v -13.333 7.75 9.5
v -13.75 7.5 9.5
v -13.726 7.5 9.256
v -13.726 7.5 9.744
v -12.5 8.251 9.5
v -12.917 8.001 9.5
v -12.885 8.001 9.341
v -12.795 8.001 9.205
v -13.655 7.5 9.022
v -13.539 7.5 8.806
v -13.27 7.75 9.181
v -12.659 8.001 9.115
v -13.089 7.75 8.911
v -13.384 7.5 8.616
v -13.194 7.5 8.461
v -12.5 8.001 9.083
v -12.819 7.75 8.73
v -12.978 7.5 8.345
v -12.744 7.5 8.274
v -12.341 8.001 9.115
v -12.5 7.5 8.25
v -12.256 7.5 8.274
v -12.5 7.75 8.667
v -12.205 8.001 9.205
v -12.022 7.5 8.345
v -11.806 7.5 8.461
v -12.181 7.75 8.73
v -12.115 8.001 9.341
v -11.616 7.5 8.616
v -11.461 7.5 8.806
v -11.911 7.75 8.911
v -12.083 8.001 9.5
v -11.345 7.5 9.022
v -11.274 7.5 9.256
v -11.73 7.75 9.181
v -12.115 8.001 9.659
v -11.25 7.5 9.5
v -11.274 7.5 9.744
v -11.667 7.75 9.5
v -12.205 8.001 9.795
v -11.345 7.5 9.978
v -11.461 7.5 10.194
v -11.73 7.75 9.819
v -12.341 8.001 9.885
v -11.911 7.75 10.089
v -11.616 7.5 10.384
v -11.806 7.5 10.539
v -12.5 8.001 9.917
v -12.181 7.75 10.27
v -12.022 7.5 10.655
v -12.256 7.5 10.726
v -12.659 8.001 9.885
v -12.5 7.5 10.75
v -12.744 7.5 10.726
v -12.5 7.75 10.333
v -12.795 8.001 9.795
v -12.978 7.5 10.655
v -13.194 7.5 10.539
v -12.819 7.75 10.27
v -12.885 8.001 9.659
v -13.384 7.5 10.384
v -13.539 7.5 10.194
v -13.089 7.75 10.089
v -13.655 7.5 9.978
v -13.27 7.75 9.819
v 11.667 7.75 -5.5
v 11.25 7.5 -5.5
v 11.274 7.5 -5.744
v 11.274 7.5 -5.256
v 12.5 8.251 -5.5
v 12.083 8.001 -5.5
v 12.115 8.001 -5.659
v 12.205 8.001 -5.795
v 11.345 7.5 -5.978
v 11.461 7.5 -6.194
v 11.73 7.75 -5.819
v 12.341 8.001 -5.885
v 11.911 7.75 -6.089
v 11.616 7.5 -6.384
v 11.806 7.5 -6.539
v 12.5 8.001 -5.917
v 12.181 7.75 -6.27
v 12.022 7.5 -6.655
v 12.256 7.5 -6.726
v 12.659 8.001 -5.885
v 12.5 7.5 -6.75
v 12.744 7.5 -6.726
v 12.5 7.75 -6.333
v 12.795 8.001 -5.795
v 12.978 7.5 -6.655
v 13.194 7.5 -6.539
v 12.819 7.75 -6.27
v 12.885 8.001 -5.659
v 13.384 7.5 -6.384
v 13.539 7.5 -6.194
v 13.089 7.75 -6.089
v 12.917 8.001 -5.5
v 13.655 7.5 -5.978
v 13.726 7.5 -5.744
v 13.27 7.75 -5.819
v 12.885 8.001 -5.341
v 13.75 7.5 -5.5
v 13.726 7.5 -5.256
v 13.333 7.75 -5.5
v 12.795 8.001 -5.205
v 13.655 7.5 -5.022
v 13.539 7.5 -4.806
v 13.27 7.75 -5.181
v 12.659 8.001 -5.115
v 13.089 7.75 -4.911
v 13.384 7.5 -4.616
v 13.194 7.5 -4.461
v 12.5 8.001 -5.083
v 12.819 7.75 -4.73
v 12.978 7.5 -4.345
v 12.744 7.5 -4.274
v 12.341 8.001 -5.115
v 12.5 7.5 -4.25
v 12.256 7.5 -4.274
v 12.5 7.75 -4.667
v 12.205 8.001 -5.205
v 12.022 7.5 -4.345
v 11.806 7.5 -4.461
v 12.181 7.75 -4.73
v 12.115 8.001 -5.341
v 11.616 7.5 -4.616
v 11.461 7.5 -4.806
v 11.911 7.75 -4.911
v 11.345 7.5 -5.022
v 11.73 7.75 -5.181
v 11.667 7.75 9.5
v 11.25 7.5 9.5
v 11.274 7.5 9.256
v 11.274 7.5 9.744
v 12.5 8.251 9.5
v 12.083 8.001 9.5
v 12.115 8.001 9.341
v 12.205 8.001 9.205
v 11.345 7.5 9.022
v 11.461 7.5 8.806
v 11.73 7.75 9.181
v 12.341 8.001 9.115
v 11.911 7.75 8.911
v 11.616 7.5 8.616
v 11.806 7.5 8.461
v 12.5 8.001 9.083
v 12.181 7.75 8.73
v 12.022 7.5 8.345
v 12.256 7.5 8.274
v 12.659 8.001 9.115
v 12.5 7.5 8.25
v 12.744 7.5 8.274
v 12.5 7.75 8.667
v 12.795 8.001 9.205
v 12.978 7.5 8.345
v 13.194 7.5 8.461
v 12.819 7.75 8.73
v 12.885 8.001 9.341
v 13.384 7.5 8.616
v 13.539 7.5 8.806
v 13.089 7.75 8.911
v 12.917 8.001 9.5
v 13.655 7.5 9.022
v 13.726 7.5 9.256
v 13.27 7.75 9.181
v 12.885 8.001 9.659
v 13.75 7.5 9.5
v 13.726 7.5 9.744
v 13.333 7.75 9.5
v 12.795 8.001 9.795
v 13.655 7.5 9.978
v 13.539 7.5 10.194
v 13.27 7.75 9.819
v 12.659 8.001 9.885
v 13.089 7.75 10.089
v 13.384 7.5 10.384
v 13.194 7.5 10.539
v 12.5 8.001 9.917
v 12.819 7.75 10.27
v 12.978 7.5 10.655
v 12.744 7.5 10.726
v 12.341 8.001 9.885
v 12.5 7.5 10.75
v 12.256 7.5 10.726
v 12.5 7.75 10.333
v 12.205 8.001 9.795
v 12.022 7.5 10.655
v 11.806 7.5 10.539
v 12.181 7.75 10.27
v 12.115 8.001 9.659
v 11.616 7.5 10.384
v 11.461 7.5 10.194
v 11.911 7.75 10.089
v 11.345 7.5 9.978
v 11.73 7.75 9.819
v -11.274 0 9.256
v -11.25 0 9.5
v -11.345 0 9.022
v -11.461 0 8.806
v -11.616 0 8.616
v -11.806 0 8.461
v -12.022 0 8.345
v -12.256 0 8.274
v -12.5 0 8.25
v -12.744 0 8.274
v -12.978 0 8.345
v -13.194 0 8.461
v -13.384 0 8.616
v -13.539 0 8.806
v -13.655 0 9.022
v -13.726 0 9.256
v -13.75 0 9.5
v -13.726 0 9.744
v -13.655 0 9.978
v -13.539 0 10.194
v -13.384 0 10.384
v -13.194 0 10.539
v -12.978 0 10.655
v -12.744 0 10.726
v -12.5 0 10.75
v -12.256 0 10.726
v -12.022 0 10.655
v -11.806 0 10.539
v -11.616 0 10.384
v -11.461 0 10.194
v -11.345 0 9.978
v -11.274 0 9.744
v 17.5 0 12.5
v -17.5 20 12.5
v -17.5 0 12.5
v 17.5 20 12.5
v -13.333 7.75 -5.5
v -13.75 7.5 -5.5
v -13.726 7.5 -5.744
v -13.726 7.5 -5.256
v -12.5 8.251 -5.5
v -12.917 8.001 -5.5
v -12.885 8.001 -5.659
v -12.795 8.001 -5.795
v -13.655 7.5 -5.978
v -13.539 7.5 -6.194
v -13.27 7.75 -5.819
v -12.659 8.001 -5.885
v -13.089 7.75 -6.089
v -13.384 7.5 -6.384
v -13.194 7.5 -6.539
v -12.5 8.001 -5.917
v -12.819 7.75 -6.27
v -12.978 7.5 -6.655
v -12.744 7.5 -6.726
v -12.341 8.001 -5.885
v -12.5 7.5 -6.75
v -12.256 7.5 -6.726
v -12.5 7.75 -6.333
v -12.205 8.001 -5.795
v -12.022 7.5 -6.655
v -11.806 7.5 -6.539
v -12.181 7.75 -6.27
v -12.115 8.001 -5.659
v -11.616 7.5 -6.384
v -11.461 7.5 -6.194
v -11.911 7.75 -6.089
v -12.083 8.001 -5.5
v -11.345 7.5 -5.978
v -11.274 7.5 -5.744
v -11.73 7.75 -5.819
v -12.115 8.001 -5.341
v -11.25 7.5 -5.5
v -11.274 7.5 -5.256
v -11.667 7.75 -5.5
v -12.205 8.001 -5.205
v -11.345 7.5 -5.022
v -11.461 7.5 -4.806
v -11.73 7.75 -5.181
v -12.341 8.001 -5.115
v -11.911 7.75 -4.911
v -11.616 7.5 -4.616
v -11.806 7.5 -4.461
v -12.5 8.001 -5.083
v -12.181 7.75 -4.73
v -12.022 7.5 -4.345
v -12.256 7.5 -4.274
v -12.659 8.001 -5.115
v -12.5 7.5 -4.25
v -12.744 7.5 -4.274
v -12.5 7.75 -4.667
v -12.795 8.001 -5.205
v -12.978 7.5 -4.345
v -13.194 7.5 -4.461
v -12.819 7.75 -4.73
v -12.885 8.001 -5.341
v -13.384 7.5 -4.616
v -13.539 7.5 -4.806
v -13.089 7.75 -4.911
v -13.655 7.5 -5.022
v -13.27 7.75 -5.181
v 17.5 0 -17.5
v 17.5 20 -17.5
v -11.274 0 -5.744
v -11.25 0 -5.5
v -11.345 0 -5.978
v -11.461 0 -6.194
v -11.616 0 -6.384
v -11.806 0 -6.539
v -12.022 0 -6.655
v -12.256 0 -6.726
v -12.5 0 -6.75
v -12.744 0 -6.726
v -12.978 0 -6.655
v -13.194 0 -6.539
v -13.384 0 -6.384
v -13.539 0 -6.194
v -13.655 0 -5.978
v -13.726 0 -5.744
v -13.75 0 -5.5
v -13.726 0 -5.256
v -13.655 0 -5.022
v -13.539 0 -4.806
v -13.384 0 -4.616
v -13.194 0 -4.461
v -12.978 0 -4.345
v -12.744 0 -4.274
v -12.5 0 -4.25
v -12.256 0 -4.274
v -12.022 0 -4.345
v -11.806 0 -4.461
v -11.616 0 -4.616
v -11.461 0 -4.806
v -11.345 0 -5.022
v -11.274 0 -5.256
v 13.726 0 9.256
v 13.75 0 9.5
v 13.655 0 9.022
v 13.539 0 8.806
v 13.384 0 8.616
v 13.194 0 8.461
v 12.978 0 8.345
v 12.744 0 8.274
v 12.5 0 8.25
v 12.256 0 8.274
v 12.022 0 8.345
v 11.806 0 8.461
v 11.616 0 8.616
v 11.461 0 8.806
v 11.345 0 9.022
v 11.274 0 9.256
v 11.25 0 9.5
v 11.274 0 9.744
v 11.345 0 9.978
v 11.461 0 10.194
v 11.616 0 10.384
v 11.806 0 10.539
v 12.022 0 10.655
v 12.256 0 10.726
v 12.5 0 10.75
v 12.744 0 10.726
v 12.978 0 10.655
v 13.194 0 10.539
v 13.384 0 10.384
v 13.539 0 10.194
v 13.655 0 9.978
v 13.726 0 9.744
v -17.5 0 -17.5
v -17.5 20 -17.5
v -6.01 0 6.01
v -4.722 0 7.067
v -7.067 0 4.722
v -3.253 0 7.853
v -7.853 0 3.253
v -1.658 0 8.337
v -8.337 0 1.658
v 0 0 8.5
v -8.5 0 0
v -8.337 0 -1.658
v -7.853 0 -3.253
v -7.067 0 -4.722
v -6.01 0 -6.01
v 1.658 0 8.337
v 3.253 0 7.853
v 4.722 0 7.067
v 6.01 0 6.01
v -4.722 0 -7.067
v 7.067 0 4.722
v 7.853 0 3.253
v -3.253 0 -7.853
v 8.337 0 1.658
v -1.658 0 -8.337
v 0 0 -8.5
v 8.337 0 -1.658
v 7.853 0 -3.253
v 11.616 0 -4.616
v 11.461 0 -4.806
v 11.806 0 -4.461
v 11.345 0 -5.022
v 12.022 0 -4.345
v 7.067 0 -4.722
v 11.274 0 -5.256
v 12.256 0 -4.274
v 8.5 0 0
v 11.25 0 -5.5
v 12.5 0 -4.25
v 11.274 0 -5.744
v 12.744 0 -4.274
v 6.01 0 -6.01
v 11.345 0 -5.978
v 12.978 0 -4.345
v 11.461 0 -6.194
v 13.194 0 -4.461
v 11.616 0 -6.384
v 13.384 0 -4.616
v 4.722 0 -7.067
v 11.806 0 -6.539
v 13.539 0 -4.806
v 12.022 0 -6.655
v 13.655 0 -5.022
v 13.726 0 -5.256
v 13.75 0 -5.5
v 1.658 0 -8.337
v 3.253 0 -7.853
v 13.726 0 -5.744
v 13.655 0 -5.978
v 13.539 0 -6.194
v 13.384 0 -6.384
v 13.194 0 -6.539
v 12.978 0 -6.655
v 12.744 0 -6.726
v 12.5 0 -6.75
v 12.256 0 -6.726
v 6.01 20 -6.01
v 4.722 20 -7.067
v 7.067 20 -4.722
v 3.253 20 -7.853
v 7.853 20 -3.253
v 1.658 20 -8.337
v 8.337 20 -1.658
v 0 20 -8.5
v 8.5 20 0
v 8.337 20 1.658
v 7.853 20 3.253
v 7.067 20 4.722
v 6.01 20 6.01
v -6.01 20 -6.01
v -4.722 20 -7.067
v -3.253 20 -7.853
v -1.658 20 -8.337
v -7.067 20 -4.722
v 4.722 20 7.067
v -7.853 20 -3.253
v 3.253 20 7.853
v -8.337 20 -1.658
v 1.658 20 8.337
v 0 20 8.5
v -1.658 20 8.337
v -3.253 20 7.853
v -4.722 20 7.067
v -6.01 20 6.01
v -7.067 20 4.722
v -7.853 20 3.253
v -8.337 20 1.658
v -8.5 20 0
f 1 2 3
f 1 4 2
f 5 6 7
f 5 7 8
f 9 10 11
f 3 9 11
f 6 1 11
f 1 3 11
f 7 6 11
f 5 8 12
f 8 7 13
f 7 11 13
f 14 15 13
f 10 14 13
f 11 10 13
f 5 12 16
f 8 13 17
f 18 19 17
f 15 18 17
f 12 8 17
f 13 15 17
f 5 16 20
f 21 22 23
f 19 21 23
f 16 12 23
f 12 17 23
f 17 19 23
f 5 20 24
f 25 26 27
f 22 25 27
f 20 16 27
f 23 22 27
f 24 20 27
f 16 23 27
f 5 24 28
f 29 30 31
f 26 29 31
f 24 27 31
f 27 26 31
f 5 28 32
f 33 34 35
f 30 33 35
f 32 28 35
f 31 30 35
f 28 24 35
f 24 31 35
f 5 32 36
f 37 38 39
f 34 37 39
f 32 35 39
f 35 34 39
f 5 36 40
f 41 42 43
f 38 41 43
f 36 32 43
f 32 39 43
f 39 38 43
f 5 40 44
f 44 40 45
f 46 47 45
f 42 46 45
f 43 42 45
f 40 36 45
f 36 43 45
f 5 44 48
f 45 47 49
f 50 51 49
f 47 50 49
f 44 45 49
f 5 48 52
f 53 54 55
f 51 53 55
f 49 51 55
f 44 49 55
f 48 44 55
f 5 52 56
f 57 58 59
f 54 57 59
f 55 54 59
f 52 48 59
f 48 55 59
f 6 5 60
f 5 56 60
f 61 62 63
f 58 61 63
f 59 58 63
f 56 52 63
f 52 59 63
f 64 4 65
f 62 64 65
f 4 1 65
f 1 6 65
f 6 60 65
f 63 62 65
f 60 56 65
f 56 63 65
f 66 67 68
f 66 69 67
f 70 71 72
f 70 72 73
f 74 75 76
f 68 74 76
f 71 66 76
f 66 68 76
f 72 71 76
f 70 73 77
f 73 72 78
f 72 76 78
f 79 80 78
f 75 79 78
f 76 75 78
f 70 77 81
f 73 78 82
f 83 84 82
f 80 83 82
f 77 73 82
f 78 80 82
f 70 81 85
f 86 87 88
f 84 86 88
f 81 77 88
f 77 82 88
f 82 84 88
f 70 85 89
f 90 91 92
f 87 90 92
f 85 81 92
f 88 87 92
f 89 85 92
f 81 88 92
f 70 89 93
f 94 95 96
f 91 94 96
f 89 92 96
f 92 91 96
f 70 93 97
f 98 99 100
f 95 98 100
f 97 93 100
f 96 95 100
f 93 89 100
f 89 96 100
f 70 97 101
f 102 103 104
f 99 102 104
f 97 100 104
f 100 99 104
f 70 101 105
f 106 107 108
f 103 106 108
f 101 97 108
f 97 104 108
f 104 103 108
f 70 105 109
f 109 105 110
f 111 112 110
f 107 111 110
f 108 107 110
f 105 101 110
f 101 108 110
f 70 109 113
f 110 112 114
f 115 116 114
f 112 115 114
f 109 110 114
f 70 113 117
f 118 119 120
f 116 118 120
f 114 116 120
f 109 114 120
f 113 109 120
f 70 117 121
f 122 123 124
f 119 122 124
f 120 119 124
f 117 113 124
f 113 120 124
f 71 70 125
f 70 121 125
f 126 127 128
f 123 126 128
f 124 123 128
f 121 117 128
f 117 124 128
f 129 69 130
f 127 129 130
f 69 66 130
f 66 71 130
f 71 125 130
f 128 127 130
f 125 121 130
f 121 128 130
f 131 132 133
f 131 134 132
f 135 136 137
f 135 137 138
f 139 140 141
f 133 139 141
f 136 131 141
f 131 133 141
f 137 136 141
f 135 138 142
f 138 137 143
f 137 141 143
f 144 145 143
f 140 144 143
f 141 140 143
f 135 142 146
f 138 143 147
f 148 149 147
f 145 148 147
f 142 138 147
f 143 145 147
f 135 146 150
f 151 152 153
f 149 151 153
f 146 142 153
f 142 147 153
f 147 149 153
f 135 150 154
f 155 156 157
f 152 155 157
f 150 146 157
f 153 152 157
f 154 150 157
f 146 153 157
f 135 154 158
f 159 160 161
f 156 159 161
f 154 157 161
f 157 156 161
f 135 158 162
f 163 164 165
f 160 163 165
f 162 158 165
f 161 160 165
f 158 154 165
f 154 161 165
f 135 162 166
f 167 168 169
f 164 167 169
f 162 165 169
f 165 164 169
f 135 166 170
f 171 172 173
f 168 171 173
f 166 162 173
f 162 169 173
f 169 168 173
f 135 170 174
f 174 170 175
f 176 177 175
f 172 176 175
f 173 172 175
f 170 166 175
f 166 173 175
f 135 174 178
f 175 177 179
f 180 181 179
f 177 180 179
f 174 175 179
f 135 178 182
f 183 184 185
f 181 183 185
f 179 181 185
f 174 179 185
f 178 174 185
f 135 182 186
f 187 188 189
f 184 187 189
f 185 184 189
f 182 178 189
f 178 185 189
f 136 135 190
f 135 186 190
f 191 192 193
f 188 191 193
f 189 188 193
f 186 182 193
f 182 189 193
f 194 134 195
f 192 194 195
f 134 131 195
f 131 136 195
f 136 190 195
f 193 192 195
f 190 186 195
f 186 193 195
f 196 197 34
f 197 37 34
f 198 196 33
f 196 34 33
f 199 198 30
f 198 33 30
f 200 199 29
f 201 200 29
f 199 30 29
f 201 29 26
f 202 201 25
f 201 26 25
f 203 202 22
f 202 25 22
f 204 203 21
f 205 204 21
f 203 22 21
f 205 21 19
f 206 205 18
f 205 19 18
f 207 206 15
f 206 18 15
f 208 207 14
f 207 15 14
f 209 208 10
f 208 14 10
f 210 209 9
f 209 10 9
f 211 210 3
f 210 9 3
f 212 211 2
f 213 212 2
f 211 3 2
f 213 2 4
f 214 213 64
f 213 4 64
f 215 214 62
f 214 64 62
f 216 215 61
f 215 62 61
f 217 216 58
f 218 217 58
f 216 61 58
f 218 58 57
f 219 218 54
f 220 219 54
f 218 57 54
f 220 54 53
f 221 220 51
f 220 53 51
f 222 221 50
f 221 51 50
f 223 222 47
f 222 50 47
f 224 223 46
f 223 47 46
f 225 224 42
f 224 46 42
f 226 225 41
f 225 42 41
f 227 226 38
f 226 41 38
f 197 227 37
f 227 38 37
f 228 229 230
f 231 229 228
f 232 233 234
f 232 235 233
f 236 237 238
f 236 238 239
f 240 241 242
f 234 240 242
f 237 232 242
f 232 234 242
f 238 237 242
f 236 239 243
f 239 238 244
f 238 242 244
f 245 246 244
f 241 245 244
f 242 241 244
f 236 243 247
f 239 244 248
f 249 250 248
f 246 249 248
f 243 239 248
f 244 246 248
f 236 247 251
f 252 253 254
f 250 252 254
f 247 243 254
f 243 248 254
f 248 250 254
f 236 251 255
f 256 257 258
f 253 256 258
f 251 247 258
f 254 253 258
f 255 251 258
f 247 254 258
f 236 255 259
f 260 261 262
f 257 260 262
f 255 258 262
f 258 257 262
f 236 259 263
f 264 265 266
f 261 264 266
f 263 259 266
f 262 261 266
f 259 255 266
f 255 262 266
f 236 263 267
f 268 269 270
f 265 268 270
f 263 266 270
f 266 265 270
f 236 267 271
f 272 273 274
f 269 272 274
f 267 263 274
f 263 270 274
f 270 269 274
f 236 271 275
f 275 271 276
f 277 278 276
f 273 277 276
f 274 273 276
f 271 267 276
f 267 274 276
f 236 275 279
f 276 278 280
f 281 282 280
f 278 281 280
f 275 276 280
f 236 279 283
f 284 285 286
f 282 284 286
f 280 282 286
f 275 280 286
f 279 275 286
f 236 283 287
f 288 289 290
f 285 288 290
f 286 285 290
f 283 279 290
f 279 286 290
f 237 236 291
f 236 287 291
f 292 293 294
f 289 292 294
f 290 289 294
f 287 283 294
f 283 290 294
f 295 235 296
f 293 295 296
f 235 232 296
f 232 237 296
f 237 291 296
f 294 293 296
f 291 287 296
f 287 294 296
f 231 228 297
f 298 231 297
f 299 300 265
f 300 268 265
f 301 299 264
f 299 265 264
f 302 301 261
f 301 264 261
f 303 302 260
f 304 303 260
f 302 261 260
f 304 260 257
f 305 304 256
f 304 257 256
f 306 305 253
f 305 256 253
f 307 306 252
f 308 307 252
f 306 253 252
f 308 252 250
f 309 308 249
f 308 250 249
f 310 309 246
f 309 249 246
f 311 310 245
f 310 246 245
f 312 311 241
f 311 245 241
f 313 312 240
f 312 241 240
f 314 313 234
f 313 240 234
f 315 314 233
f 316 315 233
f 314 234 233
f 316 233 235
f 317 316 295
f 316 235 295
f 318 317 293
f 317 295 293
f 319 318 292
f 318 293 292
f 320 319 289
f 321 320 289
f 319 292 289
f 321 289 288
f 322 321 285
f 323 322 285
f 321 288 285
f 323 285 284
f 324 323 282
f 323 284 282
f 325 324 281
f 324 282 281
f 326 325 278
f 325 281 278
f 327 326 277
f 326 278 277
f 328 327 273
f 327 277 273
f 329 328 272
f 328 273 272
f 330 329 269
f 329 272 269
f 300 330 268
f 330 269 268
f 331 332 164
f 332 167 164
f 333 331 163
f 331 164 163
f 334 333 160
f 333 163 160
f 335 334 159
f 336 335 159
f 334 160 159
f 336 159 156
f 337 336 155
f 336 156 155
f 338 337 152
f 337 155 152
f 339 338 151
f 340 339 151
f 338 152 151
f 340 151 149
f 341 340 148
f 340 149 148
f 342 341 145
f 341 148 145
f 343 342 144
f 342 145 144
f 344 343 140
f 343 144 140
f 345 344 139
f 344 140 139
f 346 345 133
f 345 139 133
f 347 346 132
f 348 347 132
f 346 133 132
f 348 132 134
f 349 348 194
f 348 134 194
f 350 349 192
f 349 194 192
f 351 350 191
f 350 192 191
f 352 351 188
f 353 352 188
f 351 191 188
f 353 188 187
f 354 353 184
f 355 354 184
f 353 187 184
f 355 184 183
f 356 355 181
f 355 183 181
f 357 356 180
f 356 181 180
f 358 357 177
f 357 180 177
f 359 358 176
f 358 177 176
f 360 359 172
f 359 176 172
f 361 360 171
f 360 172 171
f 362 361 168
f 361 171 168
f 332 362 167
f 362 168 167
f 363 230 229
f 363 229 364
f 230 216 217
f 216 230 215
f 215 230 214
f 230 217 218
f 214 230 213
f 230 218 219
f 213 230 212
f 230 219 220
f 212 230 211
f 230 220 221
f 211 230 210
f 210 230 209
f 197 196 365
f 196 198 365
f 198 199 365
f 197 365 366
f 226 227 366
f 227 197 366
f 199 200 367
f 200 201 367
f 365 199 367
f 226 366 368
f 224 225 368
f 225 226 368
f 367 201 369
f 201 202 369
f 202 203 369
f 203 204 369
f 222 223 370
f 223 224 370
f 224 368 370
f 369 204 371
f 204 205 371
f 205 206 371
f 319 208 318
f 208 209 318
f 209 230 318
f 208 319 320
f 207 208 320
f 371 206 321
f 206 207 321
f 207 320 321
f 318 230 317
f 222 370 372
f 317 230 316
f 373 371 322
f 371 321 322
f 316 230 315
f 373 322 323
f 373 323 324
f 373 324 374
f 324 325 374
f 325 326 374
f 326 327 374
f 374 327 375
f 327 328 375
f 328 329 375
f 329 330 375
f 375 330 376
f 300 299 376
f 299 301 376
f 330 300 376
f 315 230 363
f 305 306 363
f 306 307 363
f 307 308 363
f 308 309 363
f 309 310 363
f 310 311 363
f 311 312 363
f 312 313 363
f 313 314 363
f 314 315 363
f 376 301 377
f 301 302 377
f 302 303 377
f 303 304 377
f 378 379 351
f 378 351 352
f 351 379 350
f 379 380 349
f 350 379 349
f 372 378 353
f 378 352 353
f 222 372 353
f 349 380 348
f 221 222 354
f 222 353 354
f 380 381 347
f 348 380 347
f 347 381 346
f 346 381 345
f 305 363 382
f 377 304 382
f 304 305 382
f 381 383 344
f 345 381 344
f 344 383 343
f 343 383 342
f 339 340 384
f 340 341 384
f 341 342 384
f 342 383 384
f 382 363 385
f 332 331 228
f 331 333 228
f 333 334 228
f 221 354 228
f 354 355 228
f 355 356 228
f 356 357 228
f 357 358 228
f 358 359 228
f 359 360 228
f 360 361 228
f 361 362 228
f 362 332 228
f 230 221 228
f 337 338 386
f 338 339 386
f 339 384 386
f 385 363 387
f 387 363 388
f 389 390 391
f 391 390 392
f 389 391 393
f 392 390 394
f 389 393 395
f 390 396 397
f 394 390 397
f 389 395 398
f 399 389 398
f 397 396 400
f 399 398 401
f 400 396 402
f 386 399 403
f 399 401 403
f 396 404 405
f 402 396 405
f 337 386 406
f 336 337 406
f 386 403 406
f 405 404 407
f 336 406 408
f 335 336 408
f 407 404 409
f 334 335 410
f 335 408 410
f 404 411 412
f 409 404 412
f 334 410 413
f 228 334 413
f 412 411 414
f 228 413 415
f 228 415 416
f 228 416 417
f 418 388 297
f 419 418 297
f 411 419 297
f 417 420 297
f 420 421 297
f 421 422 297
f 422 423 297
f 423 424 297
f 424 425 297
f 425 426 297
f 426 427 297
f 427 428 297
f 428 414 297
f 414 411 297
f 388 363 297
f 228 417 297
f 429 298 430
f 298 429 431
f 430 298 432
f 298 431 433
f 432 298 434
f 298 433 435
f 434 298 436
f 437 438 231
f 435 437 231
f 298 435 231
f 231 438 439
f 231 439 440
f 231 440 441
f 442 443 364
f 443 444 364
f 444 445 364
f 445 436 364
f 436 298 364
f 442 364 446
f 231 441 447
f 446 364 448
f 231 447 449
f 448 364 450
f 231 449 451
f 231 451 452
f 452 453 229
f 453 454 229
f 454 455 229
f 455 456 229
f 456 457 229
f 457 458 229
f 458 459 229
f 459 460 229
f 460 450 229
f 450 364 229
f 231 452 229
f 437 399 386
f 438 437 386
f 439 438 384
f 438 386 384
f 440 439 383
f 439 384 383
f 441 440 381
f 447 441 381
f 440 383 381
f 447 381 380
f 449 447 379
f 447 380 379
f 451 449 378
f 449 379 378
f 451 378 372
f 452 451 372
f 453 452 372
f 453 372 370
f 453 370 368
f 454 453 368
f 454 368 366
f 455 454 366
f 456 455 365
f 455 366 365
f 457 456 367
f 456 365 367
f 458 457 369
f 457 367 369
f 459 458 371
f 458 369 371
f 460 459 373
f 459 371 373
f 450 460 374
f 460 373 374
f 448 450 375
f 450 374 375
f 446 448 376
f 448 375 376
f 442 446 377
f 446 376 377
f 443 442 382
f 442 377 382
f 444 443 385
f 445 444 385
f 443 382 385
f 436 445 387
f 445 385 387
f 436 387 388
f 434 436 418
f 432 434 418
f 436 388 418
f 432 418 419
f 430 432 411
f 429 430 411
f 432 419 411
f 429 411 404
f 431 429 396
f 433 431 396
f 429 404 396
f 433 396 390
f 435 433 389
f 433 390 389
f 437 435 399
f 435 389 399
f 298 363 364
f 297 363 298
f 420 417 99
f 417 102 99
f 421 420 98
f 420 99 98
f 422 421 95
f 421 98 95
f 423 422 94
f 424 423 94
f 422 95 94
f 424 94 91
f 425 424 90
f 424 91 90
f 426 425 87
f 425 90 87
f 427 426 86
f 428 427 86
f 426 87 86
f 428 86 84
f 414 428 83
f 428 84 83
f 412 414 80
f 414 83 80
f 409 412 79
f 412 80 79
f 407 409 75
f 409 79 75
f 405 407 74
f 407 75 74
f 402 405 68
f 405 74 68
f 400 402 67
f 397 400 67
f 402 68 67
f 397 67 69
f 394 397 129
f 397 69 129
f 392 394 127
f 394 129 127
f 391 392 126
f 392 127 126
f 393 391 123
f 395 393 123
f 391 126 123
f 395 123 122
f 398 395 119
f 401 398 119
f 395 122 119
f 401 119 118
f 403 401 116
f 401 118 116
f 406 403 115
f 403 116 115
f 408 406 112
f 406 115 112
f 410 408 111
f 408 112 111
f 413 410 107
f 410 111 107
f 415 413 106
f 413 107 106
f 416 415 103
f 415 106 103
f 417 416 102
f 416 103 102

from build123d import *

# Parameters (mm, degrees)
SKETCH1_W             = 35
SKETCH1_H             = 35
BOSS_EXTRUDE1_DEPTH   = 20
SKETCH2_W             = 35
SKETCH2_H             = 7
BOSS_EXTRUDE2_DEPTH   = 27
SKETCH3_R             = 8.5
CUT_EXTRUDE1_DEPTH    = 20
CUT_EXTRUDE3_REACH    = 22
SKETCH7_W             = 35
SKETCH7_H             = 5
SKETCH9_W             = 7
SKETCH9_H             = 27
CUT_EXTRUDE4_DEPTH    = 40
M3_TAPPED_HOLE3_D     = 2.5
M3_TAPPED_HOLE3_DEPTH = 7.5
M3_TAPPED_HOLE3_TIP   = 0.751075774


with BuildPart() as part:
    # Sketch1 → Boss-Extrude1 (new body)
    with BuildSketch(Plane(origin=(0, 0, 0), x_dir=(1, 0, 0), z_dir=(0, 1, 0))):
        Rectangle(SKETCH1_W, SKETCH1_H)
    extrude(amount=BOSS_EXTRUDE1_DEPTH)

    # Sketch2 → Boss-Extrude2 (add)
    with BuildSketch(Plane(origin=(0, 20, 0), x_dir=(1, 0, 0), z_dir=(0, 1, 0))):
        with Locations((0, 14)):
            Rectangle(SKETCH2_W, SKETCH2_H)
    extrude(amount=BOSS_EXTRUDE2_DEPTH)

    # Sketch3 → Cut-Extrude1 (cut)
    with BuildSketch(Plane.XZ):
        Circle(SKETCH3_R)
    extrude(amount=-CUT_EXTRUDE1_DEPTH, mode=Mode.SUBTRACT)

    # Sketch7 → Cut-Extrude3 (cut, up to next)
    with BuildSketch(Plane(origin=(0, 20, 0), x_dir=(1, 0, 0), z_dir=(0, 1, 0)), mode=Mode.PRIVATE) as cut_extrude3_sk1:
        with Locations((0, -15)):
            Rectangle(SKETCH7_W, SKETCH7_H)
    cut_extrude3_tool1 = extrude(cut_extrude3_sk1.sketch, amount=-CUT_EXTRUDE3_REACH, mode=Mode.PRIVATE) & part.part
    add(cut_extrude3_tool1.solids().sort_by_distance((0, 20, 15))[0], mode=Mode.SUBTRACT)

    # Sketch9 → Cut-Extrude4 (cut)
    with BuildSketch(Plane.ZY.offset(17.5)):
        with Locations((-14, 33.5)):
            Rectangle(SKETCH9_W, SKETCH9_H)
    extrude(amount=-CUT_EXTRUDE4_DEPTH, mode=Mode.SUBTRACT)

    # M3 Tapped Hole3
    with Locations(Plane(origin=(0, 0, 0), x_dir=(-1, 0, 0), z_dir=(0, -1, 0))):
        with Locations((12.5, 5.5), (-12.5, 5.5), (-12.5, -9.5), (12.5, -9.5)):
            Hole(M3_TAPPED_HOLE3_D / 2, depth=M3_TAPPED_HOLE3_DEPTH)
            with Locations((0, 0, -(M3_TAPPED_HOLE3_DEPTH + M3_TAPPED_HOLE3_TIP / 2))):  # 118° drill point
                Cone(0, M3_TAPPED_HOLE3_D / 2, M3_TAPPED_HOLE3_TIP, mode=Mode.SUBTRACT)


solid = part.part
